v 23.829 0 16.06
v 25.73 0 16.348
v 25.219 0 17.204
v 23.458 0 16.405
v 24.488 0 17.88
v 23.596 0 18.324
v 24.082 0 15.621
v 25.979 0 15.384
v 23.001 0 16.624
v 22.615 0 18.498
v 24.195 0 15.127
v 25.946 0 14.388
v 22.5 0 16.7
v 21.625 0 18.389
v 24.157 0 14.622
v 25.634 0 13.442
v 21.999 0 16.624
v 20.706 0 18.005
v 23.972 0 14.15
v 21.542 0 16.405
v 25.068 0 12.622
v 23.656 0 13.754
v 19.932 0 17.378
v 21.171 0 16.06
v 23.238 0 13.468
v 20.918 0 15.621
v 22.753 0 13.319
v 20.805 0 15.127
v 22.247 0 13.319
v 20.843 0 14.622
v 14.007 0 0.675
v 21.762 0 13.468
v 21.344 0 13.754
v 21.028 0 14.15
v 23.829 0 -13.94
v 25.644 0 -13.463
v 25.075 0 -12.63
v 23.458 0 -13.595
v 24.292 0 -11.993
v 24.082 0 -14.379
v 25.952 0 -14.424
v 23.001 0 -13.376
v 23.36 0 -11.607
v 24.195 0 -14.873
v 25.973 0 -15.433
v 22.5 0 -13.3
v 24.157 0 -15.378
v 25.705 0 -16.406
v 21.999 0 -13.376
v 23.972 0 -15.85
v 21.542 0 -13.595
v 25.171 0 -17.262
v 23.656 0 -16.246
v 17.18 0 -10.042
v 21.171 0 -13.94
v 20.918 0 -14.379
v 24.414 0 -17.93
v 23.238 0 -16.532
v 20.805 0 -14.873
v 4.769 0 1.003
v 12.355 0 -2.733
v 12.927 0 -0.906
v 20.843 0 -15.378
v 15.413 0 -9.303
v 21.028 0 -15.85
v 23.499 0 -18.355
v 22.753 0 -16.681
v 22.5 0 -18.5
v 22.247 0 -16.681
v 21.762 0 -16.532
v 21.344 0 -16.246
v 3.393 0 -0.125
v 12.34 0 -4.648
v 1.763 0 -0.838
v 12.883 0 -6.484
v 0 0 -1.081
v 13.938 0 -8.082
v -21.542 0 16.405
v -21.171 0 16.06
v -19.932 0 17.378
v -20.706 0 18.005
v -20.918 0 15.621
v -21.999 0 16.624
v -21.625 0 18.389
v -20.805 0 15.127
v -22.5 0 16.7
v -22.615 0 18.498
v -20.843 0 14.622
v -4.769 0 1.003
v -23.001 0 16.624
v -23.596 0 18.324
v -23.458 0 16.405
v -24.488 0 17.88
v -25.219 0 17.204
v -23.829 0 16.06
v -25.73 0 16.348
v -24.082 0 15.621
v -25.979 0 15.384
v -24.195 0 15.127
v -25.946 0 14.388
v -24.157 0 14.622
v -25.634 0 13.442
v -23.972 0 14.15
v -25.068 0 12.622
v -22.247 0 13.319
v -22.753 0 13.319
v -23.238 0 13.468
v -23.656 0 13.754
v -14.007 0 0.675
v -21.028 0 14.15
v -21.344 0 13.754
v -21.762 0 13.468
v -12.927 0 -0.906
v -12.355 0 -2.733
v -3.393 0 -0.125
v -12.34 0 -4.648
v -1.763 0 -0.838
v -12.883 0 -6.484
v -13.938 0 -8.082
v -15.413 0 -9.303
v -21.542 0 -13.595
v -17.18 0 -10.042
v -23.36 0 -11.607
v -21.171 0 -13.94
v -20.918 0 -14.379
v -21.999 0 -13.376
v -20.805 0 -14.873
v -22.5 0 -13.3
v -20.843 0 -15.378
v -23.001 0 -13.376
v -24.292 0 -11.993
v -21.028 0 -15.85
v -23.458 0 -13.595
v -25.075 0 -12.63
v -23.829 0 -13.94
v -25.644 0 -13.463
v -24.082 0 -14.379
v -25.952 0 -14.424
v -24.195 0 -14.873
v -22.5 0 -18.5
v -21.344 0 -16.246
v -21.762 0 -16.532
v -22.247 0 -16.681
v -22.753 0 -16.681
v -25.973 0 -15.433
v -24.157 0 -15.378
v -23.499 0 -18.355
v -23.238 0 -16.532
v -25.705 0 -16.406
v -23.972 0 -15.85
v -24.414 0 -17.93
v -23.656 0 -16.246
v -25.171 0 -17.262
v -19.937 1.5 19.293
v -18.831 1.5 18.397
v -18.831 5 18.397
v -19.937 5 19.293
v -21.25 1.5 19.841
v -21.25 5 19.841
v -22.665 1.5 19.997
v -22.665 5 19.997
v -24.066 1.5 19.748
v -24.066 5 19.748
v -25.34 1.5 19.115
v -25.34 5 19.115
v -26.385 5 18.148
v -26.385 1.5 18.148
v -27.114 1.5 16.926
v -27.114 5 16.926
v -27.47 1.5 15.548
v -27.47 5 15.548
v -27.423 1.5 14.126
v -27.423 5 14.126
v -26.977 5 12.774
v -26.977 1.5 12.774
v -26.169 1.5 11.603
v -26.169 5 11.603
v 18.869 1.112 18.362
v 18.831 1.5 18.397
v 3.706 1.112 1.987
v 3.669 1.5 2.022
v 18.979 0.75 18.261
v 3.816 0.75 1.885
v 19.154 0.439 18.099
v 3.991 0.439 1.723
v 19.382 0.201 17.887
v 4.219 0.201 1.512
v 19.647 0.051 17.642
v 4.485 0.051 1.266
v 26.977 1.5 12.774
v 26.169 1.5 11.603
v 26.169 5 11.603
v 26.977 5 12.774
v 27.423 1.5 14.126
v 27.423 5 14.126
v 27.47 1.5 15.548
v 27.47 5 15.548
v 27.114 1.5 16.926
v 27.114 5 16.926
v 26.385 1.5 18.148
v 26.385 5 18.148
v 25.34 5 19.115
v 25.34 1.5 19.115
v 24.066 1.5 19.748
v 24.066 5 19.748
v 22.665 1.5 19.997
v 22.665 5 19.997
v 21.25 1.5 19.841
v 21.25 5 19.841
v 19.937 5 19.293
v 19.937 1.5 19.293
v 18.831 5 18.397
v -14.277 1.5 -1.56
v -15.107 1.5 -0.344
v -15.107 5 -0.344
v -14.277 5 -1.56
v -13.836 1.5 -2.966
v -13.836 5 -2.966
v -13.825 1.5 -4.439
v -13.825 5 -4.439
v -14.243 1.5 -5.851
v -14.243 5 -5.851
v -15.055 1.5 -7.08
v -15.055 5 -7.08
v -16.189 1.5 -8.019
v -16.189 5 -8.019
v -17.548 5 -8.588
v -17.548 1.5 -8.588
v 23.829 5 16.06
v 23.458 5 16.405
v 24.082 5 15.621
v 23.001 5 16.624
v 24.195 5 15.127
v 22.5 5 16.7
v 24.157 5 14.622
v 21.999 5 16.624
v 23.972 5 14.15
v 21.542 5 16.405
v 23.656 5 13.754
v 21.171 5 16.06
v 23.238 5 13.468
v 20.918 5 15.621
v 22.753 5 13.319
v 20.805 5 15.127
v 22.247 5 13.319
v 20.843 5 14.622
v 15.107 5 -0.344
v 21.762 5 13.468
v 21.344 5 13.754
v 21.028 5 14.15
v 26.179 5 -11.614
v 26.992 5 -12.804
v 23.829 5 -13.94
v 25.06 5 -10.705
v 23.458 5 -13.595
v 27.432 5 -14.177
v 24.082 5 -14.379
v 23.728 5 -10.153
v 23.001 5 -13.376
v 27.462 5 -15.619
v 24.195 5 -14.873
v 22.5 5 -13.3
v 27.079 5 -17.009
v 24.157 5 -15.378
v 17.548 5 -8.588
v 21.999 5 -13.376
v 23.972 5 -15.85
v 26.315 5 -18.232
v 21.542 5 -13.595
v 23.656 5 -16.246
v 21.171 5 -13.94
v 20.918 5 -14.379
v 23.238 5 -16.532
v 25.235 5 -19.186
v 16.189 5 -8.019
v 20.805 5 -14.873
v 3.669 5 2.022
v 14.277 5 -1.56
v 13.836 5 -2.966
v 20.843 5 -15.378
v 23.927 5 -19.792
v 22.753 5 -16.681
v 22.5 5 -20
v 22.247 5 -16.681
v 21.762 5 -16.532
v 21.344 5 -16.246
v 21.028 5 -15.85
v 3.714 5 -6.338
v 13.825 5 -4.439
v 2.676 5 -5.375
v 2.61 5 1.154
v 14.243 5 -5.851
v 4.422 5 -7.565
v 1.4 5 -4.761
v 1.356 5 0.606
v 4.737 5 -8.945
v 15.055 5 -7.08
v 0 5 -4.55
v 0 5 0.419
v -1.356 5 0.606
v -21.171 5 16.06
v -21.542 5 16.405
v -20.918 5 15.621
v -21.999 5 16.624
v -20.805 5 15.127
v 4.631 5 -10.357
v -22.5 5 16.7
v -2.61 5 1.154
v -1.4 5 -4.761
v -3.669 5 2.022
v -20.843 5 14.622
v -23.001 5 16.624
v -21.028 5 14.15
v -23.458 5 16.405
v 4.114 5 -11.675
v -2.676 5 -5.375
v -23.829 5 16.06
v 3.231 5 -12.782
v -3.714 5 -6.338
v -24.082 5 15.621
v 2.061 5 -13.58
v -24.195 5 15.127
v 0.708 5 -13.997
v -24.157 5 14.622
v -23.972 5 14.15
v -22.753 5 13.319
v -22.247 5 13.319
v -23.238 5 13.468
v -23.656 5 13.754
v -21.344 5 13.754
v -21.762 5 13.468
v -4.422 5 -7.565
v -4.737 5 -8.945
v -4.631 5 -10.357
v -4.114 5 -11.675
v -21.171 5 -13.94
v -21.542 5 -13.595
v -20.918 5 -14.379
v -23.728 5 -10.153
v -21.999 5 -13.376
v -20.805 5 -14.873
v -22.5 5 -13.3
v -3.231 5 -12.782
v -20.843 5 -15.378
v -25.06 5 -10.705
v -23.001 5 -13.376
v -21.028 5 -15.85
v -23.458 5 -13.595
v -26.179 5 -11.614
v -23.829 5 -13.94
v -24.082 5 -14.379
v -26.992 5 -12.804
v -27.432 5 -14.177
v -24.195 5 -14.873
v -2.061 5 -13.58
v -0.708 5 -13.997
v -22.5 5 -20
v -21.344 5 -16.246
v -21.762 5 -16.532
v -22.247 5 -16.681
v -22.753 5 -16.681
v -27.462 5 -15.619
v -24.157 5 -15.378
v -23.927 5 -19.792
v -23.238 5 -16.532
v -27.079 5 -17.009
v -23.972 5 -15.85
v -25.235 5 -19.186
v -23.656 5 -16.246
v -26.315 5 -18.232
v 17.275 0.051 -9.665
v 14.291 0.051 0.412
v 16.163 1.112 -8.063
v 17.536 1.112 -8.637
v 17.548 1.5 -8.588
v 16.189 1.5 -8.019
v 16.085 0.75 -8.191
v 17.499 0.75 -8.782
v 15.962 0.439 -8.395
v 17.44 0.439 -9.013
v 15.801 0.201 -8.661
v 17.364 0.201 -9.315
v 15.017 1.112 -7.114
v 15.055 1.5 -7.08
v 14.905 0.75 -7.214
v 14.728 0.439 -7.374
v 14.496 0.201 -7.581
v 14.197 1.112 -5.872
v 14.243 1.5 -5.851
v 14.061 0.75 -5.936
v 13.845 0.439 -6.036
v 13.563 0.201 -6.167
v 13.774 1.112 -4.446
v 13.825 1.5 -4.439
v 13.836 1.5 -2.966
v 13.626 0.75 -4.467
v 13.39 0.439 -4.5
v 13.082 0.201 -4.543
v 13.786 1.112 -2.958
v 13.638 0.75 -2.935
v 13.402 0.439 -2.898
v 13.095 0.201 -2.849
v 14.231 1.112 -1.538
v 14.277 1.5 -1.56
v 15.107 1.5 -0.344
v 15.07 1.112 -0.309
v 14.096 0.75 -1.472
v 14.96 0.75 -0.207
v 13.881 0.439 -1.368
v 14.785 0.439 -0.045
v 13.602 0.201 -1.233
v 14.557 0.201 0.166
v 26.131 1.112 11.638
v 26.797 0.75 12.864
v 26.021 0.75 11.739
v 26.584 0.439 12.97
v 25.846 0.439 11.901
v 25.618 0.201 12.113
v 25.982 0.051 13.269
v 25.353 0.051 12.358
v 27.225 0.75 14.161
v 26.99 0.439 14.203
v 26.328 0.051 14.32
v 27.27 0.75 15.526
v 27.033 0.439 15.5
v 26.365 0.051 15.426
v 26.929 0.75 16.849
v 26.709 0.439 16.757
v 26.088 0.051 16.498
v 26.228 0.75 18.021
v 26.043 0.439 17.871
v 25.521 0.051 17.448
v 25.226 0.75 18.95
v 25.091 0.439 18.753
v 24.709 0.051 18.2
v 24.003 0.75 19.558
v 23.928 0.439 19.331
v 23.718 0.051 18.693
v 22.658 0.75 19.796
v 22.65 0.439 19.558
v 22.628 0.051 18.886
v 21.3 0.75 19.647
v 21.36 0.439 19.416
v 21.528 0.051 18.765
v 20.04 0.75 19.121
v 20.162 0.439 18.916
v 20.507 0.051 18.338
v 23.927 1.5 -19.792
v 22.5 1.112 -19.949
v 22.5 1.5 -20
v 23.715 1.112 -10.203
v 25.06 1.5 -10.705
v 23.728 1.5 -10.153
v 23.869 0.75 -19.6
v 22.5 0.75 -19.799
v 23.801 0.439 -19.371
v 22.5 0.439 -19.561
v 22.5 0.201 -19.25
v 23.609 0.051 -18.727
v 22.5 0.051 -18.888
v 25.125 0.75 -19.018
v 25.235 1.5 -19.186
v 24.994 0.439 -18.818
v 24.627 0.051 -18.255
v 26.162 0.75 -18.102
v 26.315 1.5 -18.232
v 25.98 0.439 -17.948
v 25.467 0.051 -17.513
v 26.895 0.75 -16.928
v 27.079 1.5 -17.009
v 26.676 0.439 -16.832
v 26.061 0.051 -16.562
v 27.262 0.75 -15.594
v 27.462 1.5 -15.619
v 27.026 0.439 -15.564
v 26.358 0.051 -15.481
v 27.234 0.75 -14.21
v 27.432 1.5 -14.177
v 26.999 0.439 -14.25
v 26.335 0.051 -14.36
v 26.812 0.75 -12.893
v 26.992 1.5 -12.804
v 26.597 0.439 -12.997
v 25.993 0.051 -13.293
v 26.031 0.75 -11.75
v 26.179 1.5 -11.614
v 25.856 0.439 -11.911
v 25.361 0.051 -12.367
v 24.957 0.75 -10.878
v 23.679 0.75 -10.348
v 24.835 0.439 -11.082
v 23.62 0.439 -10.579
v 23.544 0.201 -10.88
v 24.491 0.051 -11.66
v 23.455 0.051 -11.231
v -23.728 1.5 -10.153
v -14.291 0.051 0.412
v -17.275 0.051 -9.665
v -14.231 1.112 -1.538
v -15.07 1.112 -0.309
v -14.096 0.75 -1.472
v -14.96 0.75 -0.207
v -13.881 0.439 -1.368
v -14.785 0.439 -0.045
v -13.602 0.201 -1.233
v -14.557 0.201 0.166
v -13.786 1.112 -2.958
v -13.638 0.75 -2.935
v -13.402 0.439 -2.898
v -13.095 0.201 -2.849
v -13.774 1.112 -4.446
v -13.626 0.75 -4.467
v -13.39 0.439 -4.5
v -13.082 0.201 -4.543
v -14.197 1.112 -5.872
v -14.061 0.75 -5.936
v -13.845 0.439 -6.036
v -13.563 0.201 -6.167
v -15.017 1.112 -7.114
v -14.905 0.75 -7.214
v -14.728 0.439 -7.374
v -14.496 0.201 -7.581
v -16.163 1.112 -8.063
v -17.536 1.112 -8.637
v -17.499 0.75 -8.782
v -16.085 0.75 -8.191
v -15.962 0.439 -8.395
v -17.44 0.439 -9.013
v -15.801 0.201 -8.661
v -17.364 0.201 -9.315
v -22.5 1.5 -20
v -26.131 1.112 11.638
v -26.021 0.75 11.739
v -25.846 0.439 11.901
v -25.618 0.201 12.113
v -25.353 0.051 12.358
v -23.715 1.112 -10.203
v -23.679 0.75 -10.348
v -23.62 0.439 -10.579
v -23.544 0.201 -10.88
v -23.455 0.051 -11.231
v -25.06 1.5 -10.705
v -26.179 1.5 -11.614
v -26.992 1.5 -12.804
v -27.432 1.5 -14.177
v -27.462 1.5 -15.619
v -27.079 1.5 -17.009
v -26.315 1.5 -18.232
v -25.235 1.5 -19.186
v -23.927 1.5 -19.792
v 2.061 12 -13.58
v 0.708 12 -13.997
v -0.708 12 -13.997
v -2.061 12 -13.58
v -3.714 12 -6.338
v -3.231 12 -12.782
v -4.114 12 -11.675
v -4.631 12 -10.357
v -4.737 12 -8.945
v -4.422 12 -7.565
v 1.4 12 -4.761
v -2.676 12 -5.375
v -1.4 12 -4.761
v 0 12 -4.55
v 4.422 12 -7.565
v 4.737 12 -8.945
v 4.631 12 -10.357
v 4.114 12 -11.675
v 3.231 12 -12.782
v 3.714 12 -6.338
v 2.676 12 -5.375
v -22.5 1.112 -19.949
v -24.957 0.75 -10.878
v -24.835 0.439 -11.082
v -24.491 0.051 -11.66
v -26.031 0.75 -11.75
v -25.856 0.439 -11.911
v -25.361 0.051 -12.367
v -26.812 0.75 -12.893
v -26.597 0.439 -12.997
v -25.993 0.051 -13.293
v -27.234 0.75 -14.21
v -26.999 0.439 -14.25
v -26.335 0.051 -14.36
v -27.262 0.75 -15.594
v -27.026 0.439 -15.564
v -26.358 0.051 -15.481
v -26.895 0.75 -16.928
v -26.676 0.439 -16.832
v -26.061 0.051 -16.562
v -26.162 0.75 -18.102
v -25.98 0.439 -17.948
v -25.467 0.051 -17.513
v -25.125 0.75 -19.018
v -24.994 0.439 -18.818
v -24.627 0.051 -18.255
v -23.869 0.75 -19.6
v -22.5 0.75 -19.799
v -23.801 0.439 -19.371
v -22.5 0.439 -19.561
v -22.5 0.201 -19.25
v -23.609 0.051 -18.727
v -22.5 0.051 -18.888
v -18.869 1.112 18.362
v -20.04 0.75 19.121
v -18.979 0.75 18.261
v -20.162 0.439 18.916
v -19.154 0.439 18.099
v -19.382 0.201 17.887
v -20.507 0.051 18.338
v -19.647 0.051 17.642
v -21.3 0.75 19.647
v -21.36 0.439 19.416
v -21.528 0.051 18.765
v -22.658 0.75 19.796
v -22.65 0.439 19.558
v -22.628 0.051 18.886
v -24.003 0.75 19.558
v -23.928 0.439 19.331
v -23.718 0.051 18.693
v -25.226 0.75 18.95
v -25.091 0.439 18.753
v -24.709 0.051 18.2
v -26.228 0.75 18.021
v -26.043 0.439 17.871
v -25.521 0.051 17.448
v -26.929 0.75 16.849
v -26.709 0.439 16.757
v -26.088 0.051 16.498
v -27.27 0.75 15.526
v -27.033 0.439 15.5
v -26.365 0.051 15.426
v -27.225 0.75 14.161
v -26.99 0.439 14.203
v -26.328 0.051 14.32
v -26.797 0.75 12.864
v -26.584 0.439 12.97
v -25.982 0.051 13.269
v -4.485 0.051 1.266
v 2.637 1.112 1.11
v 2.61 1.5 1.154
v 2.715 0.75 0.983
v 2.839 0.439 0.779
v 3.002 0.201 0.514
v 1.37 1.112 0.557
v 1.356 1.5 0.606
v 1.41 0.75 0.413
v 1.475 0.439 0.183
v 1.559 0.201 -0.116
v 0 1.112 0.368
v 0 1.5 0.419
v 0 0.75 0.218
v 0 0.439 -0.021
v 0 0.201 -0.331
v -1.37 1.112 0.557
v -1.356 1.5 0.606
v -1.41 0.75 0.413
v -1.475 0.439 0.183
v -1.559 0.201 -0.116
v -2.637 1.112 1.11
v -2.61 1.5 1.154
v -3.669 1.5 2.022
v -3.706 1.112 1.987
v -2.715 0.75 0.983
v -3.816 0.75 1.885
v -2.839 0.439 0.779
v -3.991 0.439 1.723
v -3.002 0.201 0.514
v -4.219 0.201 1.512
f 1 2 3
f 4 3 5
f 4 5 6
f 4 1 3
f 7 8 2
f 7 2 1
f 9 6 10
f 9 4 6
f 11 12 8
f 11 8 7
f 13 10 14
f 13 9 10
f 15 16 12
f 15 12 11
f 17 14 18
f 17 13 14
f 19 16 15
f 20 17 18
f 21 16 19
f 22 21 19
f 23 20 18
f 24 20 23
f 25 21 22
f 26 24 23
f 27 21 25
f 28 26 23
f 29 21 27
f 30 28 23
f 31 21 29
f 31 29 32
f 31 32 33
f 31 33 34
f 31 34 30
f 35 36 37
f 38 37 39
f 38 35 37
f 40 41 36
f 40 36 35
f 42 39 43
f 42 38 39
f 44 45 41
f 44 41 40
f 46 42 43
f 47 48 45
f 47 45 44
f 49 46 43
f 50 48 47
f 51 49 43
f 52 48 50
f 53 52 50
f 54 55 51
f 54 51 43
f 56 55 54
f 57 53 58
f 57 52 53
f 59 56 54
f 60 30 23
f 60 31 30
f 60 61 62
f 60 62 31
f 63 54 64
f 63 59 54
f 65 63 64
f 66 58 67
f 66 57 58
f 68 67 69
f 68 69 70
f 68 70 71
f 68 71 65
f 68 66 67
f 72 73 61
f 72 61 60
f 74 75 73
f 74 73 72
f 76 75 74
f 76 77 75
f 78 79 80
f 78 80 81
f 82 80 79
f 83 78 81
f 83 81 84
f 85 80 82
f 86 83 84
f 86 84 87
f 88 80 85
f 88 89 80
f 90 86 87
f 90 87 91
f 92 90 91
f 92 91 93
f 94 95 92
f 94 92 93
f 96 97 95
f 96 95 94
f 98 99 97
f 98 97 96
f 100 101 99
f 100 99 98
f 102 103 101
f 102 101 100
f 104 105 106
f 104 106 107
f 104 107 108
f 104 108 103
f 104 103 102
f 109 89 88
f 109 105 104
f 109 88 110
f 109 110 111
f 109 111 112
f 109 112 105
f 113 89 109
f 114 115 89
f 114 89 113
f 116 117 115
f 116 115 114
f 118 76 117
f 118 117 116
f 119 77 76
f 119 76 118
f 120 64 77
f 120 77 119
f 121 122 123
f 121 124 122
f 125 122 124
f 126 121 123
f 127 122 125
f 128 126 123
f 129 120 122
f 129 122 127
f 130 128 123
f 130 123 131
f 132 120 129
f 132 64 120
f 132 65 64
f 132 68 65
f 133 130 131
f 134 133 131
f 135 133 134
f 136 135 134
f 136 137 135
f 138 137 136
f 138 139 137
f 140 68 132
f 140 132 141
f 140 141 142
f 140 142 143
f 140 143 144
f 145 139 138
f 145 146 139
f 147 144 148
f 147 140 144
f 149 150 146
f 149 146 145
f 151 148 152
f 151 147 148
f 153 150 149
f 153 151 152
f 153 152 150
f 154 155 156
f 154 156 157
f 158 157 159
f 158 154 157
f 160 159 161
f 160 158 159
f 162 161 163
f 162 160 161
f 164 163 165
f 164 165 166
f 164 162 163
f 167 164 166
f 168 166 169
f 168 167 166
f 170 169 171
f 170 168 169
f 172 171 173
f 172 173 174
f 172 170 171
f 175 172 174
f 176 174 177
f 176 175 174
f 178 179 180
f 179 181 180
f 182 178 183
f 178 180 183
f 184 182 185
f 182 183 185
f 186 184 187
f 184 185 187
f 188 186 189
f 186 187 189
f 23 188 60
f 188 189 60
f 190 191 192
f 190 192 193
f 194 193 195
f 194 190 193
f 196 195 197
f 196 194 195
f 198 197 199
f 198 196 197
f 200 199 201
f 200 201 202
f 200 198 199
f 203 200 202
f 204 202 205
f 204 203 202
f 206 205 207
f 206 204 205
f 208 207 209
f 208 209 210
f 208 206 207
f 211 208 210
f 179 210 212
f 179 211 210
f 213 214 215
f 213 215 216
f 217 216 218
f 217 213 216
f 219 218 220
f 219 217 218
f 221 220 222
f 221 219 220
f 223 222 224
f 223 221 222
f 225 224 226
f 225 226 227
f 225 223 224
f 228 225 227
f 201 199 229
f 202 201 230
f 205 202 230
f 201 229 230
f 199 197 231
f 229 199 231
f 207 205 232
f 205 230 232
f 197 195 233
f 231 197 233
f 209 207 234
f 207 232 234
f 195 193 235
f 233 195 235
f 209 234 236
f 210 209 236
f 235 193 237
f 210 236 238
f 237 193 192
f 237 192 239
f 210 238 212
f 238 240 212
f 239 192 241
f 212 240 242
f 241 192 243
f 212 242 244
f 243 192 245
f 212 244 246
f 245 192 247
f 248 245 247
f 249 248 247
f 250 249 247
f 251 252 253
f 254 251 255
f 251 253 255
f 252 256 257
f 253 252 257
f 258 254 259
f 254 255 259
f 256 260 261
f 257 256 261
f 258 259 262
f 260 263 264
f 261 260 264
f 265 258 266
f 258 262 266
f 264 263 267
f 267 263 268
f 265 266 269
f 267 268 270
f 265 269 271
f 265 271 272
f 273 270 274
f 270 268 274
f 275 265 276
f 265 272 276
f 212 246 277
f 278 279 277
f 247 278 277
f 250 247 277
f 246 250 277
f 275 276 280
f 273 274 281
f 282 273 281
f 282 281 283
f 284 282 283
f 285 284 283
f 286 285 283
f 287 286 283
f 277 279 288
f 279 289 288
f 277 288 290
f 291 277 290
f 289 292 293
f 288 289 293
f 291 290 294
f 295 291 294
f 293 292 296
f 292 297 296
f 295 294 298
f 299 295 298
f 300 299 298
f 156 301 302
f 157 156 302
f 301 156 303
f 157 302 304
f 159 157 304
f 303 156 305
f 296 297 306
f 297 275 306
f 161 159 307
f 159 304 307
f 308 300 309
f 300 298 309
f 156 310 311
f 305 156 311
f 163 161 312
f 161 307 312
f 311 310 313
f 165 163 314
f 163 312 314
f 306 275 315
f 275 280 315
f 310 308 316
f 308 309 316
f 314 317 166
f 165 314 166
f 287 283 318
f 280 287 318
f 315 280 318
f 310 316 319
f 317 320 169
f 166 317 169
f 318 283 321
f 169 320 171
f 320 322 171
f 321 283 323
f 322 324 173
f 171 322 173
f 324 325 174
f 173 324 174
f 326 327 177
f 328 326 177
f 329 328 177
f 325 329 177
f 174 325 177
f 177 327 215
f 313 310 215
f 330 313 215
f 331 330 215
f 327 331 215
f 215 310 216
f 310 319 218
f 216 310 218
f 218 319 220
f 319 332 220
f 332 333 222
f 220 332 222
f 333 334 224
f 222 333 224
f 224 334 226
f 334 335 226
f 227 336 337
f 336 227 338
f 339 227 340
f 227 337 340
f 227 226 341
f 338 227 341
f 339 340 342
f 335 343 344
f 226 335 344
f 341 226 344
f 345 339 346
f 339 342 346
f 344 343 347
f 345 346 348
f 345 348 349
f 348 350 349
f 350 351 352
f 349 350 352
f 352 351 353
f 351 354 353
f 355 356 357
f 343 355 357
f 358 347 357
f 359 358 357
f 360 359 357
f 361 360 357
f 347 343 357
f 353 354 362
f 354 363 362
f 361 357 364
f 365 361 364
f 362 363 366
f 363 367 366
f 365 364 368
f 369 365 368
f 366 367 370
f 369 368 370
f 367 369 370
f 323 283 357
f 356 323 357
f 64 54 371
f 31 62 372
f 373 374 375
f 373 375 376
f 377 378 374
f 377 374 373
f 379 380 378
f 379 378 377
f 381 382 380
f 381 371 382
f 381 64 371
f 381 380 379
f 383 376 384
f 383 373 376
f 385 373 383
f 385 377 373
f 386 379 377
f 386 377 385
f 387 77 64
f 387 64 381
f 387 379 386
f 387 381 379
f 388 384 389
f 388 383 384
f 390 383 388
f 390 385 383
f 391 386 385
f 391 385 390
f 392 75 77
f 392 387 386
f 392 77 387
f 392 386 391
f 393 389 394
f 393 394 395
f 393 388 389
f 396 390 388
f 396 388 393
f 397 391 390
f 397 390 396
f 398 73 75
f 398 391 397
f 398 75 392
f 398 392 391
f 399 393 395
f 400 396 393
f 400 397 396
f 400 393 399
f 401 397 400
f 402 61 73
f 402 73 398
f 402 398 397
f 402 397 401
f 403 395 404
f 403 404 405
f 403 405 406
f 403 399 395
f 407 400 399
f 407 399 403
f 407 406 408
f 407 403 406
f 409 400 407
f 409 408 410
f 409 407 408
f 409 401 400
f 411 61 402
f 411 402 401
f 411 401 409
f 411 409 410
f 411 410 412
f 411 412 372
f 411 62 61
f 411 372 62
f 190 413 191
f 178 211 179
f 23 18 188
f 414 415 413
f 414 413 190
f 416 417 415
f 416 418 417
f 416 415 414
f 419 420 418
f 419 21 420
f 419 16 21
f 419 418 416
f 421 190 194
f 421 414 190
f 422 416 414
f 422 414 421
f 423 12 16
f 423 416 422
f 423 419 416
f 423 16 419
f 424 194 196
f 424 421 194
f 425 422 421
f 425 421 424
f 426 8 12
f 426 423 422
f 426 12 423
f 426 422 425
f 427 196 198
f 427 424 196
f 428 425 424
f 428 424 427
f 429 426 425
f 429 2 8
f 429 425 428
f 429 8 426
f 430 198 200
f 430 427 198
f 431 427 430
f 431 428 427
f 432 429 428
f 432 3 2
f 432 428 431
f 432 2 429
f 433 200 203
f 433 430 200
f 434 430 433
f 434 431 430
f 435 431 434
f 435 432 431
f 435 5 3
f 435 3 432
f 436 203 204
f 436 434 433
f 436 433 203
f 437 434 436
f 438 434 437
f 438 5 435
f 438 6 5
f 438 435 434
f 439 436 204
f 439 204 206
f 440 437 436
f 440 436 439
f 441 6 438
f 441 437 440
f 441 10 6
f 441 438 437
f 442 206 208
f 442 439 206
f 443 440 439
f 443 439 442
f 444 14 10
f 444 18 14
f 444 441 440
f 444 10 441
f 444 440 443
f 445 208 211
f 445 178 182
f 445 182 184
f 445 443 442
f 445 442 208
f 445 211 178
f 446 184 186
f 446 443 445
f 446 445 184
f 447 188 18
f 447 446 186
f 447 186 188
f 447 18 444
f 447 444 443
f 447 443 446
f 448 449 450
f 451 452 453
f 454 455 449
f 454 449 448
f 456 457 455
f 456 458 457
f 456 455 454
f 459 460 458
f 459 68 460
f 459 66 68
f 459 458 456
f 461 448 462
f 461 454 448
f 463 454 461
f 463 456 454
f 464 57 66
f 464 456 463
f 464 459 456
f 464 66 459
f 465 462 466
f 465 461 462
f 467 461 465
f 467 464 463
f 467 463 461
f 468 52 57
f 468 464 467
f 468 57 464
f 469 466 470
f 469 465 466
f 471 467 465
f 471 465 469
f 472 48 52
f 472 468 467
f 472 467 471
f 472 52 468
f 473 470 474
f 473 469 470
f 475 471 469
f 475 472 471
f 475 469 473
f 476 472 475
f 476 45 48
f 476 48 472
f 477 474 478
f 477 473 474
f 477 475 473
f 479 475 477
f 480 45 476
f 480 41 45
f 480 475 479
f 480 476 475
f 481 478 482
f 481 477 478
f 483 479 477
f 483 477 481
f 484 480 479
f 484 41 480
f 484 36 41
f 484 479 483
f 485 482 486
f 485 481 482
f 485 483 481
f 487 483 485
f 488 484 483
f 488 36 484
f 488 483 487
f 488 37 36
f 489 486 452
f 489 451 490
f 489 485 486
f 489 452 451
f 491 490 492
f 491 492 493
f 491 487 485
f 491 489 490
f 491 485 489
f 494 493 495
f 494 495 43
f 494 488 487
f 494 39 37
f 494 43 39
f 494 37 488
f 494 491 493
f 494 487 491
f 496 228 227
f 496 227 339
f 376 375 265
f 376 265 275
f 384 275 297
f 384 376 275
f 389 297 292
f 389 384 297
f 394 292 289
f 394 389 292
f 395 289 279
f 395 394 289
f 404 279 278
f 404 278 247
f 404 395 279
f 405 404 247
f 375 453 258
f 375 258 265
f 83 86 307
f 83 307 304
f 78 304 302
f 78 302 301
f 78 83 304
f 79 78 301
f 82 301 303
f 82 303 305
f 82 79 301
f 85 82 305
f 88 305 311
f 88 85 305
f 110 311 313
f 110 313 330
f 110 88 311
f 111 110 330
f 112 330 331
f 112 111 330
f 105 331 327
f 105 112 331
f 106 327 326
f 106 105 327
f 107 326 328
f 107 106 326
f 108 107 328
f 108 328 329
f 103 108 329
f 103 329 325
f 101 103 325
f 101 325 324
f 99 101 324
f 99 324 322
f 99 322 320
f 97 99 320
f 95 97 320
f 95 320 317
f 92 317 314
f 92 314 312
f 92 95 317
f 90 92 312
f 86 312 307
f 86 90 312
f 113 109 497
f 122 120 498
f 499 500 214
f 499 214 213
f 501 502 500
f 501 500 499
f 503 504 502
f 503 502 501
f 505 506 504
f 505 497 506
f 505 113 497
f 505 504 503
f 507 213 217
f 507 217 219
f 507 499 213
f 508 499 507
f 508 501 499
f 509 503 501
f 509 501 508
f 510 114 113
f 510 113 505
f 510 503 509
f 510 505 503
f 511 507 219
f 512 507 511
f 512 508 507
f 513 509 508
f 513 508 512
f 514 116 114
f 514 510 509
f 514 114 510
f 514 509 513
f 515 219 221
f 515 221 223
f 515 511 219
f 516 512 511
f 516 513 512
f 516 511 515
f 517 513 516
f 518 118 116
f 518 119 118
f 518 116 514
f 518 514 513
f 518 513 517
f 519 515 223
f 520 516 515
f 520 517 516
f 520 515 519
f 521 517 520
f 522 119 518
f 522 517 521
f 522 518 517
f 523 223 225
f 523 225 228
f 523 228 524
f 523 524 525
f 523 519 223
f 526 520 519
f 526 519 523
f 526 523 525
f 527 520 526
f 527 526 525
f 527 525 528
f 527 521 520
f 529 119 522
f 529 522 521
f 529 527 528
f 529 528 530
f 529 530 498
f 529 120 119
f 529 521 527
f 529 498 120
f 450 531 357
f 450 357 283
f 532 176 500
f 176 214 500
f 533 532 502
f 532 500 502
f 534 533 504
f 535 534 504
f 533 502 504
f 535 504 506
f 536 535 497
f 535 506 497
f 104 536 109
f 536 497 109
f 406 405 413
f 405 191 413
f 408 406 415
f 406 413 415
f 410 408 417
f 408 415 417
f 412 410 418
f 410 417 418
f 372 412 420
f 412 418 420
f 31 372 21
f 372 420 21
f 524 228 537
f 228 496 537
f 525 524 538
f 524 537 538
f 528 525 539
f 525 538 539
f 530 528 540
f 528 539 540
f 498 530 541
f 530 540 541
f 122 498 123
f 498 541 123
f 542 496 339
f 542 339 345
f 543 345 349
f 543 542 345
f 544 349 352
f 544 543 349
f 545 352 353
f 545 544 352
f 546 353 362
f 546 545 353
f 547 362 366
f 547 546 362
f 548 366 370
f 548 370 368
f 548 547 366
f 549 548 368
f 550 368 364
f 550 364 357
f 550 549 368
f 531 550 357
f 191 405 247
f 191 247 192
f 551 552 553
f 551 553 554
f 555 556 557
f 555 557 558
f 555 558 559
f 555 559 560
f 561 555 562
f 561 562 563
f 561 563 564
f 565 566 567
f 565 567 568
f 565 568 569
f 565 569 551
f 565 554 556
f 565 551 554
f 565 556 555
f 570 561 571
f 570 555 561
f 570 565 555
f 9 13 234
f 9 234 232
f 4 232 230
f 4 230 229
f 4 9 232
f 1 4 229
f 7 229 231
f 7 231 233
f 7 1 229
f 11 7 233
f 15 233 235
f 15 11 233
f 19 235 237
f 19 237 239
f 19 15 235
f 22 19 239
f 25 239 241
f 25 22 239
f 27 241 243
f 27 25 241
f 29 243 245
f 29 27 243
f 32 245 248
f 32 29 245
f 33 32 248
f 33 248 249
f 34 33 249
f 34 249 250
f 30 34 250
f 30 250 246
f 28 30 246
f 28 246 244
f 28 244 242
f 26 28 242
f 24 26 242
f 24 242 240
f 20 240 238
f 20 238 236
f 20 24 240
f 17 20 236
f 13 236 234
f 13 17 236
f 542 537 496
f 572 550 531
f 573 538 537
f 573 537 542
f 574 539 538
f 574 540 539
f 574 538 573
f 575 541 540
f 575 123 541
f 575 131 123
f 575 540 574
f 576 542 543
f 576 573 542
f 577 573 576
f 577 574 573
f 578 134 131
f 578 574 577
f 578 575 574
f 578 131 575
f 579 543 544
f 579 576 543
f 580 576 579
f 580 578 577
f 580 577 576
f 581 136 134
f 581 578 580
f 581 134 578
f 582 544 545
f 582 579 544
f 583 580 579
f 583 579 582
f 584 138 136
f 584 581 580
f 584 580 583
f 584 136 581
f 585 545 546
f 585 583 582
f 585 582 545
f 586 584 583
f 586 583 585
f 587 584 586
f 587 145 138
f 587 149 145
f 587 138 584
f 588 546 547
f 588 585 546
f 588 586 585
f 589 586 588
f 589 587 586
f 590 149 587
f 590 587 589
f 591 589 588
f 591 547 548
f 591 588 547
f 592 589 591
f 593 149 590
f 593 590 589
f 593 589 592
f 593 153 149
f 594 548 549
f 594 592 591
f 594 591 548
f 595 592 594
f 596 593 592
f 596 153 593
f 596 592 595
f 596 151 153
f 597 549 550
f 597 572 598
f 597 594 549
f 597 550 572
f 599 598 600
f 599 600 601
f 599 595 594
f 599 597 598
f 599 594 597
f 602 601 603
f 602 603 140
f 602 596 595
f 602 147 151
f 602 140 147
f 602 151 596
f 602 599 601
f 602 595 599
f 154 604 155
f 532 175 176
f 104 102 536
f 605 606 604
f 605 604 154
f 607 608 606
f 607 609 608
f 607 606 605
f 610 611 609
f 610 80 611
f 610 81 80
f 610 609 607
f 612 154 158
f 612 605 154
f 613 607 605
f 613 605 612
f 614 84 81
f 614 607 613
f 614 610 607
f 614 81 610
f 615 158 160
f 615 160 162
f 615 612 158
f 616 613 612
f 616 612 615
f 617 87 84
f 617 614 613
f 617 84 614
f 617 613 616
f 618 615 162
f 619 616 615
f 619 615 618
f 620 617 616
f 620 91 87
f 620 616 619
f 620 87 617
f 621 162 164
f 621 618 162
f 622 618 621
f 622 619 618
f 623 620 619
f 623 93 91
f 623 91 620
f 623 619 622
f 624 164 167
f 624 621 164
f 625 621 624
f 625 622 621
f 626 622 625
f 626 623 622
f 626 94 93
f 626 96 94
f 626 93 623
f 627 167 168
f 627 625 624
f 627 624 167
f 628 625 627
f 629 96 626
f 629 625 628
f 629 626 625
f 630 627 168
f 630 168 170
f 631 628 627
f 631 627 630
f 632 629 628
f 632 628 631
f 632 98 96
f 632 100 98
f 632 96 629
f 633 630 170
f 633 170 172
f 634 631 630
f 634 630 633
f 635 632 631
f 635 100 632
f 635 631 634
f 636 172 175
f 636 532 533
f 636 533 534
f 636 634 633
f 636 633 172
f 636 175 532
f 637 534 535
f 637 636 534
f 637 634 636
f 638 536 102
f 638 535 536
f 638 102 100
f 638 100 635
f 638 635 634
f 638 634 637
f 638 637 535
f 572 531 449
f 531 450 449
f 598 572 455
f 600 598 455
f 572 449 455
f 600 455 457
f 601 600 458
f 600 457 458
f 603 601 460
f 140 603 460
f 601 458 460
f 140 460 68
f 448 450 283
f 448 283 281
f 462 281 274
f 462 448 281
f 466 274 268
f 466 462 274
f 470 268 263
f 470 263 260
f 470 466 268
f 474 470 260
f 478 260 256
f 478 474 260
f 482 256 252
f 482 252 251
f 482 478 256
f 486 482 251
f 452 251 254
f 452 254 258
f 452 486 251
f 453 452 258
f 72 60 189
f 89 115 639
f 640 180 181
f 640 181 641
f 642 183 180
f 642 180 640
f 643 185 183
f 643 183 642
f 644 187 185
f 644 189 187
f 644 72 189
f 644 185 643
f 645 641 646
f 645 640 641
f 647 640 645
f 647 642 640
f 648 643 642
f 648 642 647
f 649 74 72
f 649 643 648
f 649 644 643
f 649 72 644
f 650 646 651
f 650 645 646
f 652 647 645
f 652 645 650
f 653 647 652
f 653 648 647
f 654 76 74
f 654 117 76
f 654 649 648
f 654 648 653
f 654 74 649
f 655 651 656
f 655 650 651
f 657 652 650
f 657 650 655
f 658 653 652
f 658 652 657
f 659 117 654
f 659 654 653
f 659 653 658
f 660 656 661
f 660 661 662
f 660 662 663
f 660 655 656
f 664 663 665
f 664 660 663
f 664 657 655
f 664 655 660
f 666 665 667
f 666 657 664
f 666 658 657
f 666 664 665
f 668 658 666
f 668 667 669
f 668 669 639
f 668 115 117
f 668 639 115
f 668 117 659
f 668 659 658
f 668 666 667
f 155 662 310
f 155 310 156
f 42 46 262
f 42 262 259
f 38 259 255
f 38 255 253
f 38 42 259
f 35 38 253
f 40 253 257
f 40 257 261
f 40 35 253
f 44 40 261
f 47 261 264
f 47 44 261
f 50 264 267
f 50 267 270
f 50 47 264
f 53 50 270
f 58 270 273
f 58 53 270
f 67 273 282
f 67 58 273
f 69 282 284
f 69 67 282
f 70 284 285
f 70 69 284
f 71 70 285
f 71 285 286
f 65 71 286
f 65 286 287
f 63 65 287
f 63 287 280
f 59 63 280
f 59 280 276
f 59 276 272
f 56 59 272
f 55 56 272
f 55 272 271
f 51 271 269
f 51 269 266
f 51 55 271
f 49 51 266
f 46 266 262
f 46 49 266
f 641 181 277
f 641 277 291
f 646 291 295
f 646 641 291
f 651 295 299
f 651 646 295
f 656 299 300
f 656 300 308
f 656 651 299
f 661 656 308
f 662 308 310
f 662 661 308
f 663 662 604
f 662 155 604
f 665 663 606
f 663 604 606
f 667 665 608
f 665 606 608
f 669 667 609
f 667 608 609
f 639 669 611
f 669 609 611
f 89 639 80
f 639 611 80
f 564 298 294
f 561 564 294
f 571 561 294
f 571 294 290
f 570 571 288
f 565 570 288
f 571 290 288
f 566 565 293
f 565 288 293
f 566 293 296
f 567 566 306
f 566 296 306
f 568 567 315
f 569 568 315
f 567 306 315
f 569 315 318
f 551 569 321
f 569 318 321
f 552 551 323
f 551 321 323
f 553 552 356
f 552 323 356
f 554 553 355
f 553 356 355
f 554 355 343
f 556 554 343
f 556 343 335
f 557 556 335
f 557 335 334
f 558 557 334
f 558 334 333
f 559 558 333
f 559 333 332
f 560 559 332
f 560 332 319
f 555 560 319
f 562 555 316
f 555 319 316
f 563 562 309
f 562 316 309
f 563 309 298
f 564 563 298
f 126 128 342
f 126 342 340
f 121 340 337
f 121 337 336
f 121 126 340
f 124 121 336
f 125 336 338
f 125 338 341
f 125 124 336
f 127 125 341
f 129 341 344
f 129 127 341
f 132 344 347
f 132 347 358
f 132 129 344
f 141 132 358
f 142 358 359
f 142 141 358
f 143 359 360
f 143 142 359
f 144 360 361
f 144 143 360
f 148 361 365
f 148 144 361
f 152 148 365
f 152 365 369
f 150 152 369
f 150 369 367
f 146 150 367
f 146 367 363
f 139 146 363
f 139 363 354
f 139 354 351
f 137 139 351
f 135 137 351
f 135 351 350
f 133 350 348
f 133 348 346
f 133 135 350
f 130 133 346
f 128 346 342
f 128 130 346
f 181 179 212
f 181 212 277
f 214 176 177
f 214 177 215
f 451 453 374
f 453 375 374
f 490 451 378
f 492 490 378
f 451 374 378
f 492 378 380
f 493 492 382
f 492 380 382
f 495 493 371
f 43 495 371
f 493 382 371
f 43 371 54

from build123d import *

# Parameters (mm, degrees)
SKETCH1_R           = 1.7
BOSS_EXTRUDE1_DEPTH = 5
SKETCH2_R           = 4.75
BOSS_EXTRUDE2_DEPTH = 7
FILLET1_R           = 1.5


with BuildPart() as part:
    # Sketch1 → Boss-Extrude1 (new body)
    with BuildSketch(Plane(origin=(0, 0, 0), x_dir=(1, 0, 0), z_dir=(0, 1, 0))):
        with BuildLine():
            Line((-26.16880337, -11.602959843), (-15.107142779, 0.343633596))
            ThreePointArc((-15.107142779, 0.343633596), (-13.981683241, 5.160195913), (-17.548068062, 8.58756094))
            Line((-17.548068062, 8.58756094), (-23.727878087, 10.153112813))
            ThreePointArc((-23.727878087, 10.153112813), (-27.461574142, 15.618693812), (-22.5, 20))
            Line((-22.5, 20), (22.5, 20))
            ThreePointArc((22.5, 20), (27.461574142, 15.618693812), (23.727878087, 10.153112813))
            Line((23.727878087, 10.153112813), (17.548068062, 8.58756094))
            ThreePointArc((17.548068062, 8.58756094), (13.981683241, 5.160195913), (15.107142779, 0.343633596))
            Line((15.107142779, 0.343633596), (26.16880337, -11.602959843))
            ThreePointArc((26.16880337, -11.602959843), (25.897040157, -18.66880337), (18.83119663, -18.397040157))
            Line((18.83119663, -18.397040157), (3.66880337, -2.021655437))
            ThreePointArc((3.66880337, -2.021655437), (0, -0.418695594), (-3.66880337, -2.021655437))
            Line((-3.66880337, -2.021655437), (-18.83119663, -18.397040157))
            ThreePointArc((-18.83119663, -18.397040157), (-25.897040157, -18.66880337), (-26.16880337, -11.602959843))
        make_face()
        with Locations(Location((22.5, 15, 0), (0, 0, 270))):
            Circle(SKETCH1_R, mode=Mode.SUBTRACT)
        with Locations(Location((22.5, -15, 0), (0, 0, 270))):
            Circle(SKETCH1_R, mode=Mode.SUBTRACT)
        with Locations(Location((-22.5, 15, 0), (0, 0, 270))):
            Circle(SKETCH1_R, mode=Mode.SUBTRACT)
        with Locations(Location((-22.5, -15, 0), (0, 0, 270))):
            Circle(SKETCH1_R, mode=Mode.SUBTRACT)
    extrude(amount=BOSS_EXTRUDE1_DEPTH)

    # Sketch2 → Boss-Extrude2 (add)
    with BuildSketch(Plane(origin=(0, 5, 0), x_dir=(1, 0, 0), z_dir=(0, 1, 0))):
        with Locations(Location((0, 9.3, 0), (0, 0, 270))):
            Circle(SKETCH2_R)
    extrude(amount=BOSS_EXTRUDE2_DEPTH)

    # Fillet1
    fillet1_edges = [part.edges().sort_by_distance(p)[0] for p in [
        (-20.637973075, 0, 5.629663123),
        (-13.981683241, 0, -5.160195913),
        (-20.637973075, 0, -9.370336877),
        (-27.461574142, 0, -15.618693812),
        (0, 0, -20),
        (27.461574142, 0, -15.618693812),
        (20.637973075, 0, -9.370336877),
        (13.981683241, 0, -5.160195913),
        (20.637973075, 0, 5.629663123),
        (25.897040157, 0, 18.66880337),
        (11.25, 0, 10.209347797),
        (0, 0, 0.418695594),
        (-11.25, 0, 10.209347797),
        (-25.897040157, 0, 18.66880337),
    ]]
    fillet(fillet1_edges, radius=FILLET1_R)


solid = part.part
